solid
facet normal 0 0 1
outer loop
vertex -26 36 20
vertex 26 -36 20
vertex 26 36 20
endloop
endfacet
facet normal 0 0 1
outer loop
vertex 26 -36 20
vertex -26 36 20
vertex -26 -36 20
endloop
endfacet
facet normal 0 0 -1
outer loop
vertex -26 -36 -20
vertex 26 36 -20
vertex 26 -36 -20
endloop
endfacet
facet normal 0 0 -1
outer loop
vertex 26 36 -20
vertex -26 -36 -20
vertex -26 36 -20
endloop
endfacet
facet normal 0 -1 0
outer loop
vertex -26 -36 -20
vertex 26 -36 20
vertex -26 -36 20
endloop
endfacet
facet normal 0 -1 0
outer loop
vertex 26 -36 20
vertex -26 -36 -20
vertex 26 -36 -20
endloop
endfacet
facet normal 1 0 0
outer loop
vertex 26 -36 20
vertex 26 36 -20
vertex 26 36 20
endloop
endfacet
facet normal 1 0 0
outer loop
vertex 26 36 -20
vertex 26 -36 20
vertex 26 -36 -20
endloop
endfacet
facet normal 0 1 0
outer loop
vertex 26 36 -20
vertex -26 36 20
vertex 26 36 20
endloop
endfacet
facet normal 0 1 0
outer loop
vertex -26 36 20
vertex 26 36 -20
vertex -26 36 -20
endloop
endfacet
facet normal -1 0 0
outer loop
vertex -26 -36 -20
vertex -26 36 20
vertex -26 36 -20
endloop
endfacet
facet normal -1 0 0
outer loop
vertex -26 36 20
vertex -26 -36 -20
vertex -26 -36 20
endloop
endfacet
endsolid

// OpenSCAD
// corpus 4629984: `cylinder(r = 0)` renders as nothing in OpenSCAD, and an empty child drops out of a
// minkowski — the cube stands (the mesh route died on "fewer than 4 triangles").
minkowski() {
  cube([52, 72, 40], center = true);
  cylinder(r = 0, h = 0.01);
}
